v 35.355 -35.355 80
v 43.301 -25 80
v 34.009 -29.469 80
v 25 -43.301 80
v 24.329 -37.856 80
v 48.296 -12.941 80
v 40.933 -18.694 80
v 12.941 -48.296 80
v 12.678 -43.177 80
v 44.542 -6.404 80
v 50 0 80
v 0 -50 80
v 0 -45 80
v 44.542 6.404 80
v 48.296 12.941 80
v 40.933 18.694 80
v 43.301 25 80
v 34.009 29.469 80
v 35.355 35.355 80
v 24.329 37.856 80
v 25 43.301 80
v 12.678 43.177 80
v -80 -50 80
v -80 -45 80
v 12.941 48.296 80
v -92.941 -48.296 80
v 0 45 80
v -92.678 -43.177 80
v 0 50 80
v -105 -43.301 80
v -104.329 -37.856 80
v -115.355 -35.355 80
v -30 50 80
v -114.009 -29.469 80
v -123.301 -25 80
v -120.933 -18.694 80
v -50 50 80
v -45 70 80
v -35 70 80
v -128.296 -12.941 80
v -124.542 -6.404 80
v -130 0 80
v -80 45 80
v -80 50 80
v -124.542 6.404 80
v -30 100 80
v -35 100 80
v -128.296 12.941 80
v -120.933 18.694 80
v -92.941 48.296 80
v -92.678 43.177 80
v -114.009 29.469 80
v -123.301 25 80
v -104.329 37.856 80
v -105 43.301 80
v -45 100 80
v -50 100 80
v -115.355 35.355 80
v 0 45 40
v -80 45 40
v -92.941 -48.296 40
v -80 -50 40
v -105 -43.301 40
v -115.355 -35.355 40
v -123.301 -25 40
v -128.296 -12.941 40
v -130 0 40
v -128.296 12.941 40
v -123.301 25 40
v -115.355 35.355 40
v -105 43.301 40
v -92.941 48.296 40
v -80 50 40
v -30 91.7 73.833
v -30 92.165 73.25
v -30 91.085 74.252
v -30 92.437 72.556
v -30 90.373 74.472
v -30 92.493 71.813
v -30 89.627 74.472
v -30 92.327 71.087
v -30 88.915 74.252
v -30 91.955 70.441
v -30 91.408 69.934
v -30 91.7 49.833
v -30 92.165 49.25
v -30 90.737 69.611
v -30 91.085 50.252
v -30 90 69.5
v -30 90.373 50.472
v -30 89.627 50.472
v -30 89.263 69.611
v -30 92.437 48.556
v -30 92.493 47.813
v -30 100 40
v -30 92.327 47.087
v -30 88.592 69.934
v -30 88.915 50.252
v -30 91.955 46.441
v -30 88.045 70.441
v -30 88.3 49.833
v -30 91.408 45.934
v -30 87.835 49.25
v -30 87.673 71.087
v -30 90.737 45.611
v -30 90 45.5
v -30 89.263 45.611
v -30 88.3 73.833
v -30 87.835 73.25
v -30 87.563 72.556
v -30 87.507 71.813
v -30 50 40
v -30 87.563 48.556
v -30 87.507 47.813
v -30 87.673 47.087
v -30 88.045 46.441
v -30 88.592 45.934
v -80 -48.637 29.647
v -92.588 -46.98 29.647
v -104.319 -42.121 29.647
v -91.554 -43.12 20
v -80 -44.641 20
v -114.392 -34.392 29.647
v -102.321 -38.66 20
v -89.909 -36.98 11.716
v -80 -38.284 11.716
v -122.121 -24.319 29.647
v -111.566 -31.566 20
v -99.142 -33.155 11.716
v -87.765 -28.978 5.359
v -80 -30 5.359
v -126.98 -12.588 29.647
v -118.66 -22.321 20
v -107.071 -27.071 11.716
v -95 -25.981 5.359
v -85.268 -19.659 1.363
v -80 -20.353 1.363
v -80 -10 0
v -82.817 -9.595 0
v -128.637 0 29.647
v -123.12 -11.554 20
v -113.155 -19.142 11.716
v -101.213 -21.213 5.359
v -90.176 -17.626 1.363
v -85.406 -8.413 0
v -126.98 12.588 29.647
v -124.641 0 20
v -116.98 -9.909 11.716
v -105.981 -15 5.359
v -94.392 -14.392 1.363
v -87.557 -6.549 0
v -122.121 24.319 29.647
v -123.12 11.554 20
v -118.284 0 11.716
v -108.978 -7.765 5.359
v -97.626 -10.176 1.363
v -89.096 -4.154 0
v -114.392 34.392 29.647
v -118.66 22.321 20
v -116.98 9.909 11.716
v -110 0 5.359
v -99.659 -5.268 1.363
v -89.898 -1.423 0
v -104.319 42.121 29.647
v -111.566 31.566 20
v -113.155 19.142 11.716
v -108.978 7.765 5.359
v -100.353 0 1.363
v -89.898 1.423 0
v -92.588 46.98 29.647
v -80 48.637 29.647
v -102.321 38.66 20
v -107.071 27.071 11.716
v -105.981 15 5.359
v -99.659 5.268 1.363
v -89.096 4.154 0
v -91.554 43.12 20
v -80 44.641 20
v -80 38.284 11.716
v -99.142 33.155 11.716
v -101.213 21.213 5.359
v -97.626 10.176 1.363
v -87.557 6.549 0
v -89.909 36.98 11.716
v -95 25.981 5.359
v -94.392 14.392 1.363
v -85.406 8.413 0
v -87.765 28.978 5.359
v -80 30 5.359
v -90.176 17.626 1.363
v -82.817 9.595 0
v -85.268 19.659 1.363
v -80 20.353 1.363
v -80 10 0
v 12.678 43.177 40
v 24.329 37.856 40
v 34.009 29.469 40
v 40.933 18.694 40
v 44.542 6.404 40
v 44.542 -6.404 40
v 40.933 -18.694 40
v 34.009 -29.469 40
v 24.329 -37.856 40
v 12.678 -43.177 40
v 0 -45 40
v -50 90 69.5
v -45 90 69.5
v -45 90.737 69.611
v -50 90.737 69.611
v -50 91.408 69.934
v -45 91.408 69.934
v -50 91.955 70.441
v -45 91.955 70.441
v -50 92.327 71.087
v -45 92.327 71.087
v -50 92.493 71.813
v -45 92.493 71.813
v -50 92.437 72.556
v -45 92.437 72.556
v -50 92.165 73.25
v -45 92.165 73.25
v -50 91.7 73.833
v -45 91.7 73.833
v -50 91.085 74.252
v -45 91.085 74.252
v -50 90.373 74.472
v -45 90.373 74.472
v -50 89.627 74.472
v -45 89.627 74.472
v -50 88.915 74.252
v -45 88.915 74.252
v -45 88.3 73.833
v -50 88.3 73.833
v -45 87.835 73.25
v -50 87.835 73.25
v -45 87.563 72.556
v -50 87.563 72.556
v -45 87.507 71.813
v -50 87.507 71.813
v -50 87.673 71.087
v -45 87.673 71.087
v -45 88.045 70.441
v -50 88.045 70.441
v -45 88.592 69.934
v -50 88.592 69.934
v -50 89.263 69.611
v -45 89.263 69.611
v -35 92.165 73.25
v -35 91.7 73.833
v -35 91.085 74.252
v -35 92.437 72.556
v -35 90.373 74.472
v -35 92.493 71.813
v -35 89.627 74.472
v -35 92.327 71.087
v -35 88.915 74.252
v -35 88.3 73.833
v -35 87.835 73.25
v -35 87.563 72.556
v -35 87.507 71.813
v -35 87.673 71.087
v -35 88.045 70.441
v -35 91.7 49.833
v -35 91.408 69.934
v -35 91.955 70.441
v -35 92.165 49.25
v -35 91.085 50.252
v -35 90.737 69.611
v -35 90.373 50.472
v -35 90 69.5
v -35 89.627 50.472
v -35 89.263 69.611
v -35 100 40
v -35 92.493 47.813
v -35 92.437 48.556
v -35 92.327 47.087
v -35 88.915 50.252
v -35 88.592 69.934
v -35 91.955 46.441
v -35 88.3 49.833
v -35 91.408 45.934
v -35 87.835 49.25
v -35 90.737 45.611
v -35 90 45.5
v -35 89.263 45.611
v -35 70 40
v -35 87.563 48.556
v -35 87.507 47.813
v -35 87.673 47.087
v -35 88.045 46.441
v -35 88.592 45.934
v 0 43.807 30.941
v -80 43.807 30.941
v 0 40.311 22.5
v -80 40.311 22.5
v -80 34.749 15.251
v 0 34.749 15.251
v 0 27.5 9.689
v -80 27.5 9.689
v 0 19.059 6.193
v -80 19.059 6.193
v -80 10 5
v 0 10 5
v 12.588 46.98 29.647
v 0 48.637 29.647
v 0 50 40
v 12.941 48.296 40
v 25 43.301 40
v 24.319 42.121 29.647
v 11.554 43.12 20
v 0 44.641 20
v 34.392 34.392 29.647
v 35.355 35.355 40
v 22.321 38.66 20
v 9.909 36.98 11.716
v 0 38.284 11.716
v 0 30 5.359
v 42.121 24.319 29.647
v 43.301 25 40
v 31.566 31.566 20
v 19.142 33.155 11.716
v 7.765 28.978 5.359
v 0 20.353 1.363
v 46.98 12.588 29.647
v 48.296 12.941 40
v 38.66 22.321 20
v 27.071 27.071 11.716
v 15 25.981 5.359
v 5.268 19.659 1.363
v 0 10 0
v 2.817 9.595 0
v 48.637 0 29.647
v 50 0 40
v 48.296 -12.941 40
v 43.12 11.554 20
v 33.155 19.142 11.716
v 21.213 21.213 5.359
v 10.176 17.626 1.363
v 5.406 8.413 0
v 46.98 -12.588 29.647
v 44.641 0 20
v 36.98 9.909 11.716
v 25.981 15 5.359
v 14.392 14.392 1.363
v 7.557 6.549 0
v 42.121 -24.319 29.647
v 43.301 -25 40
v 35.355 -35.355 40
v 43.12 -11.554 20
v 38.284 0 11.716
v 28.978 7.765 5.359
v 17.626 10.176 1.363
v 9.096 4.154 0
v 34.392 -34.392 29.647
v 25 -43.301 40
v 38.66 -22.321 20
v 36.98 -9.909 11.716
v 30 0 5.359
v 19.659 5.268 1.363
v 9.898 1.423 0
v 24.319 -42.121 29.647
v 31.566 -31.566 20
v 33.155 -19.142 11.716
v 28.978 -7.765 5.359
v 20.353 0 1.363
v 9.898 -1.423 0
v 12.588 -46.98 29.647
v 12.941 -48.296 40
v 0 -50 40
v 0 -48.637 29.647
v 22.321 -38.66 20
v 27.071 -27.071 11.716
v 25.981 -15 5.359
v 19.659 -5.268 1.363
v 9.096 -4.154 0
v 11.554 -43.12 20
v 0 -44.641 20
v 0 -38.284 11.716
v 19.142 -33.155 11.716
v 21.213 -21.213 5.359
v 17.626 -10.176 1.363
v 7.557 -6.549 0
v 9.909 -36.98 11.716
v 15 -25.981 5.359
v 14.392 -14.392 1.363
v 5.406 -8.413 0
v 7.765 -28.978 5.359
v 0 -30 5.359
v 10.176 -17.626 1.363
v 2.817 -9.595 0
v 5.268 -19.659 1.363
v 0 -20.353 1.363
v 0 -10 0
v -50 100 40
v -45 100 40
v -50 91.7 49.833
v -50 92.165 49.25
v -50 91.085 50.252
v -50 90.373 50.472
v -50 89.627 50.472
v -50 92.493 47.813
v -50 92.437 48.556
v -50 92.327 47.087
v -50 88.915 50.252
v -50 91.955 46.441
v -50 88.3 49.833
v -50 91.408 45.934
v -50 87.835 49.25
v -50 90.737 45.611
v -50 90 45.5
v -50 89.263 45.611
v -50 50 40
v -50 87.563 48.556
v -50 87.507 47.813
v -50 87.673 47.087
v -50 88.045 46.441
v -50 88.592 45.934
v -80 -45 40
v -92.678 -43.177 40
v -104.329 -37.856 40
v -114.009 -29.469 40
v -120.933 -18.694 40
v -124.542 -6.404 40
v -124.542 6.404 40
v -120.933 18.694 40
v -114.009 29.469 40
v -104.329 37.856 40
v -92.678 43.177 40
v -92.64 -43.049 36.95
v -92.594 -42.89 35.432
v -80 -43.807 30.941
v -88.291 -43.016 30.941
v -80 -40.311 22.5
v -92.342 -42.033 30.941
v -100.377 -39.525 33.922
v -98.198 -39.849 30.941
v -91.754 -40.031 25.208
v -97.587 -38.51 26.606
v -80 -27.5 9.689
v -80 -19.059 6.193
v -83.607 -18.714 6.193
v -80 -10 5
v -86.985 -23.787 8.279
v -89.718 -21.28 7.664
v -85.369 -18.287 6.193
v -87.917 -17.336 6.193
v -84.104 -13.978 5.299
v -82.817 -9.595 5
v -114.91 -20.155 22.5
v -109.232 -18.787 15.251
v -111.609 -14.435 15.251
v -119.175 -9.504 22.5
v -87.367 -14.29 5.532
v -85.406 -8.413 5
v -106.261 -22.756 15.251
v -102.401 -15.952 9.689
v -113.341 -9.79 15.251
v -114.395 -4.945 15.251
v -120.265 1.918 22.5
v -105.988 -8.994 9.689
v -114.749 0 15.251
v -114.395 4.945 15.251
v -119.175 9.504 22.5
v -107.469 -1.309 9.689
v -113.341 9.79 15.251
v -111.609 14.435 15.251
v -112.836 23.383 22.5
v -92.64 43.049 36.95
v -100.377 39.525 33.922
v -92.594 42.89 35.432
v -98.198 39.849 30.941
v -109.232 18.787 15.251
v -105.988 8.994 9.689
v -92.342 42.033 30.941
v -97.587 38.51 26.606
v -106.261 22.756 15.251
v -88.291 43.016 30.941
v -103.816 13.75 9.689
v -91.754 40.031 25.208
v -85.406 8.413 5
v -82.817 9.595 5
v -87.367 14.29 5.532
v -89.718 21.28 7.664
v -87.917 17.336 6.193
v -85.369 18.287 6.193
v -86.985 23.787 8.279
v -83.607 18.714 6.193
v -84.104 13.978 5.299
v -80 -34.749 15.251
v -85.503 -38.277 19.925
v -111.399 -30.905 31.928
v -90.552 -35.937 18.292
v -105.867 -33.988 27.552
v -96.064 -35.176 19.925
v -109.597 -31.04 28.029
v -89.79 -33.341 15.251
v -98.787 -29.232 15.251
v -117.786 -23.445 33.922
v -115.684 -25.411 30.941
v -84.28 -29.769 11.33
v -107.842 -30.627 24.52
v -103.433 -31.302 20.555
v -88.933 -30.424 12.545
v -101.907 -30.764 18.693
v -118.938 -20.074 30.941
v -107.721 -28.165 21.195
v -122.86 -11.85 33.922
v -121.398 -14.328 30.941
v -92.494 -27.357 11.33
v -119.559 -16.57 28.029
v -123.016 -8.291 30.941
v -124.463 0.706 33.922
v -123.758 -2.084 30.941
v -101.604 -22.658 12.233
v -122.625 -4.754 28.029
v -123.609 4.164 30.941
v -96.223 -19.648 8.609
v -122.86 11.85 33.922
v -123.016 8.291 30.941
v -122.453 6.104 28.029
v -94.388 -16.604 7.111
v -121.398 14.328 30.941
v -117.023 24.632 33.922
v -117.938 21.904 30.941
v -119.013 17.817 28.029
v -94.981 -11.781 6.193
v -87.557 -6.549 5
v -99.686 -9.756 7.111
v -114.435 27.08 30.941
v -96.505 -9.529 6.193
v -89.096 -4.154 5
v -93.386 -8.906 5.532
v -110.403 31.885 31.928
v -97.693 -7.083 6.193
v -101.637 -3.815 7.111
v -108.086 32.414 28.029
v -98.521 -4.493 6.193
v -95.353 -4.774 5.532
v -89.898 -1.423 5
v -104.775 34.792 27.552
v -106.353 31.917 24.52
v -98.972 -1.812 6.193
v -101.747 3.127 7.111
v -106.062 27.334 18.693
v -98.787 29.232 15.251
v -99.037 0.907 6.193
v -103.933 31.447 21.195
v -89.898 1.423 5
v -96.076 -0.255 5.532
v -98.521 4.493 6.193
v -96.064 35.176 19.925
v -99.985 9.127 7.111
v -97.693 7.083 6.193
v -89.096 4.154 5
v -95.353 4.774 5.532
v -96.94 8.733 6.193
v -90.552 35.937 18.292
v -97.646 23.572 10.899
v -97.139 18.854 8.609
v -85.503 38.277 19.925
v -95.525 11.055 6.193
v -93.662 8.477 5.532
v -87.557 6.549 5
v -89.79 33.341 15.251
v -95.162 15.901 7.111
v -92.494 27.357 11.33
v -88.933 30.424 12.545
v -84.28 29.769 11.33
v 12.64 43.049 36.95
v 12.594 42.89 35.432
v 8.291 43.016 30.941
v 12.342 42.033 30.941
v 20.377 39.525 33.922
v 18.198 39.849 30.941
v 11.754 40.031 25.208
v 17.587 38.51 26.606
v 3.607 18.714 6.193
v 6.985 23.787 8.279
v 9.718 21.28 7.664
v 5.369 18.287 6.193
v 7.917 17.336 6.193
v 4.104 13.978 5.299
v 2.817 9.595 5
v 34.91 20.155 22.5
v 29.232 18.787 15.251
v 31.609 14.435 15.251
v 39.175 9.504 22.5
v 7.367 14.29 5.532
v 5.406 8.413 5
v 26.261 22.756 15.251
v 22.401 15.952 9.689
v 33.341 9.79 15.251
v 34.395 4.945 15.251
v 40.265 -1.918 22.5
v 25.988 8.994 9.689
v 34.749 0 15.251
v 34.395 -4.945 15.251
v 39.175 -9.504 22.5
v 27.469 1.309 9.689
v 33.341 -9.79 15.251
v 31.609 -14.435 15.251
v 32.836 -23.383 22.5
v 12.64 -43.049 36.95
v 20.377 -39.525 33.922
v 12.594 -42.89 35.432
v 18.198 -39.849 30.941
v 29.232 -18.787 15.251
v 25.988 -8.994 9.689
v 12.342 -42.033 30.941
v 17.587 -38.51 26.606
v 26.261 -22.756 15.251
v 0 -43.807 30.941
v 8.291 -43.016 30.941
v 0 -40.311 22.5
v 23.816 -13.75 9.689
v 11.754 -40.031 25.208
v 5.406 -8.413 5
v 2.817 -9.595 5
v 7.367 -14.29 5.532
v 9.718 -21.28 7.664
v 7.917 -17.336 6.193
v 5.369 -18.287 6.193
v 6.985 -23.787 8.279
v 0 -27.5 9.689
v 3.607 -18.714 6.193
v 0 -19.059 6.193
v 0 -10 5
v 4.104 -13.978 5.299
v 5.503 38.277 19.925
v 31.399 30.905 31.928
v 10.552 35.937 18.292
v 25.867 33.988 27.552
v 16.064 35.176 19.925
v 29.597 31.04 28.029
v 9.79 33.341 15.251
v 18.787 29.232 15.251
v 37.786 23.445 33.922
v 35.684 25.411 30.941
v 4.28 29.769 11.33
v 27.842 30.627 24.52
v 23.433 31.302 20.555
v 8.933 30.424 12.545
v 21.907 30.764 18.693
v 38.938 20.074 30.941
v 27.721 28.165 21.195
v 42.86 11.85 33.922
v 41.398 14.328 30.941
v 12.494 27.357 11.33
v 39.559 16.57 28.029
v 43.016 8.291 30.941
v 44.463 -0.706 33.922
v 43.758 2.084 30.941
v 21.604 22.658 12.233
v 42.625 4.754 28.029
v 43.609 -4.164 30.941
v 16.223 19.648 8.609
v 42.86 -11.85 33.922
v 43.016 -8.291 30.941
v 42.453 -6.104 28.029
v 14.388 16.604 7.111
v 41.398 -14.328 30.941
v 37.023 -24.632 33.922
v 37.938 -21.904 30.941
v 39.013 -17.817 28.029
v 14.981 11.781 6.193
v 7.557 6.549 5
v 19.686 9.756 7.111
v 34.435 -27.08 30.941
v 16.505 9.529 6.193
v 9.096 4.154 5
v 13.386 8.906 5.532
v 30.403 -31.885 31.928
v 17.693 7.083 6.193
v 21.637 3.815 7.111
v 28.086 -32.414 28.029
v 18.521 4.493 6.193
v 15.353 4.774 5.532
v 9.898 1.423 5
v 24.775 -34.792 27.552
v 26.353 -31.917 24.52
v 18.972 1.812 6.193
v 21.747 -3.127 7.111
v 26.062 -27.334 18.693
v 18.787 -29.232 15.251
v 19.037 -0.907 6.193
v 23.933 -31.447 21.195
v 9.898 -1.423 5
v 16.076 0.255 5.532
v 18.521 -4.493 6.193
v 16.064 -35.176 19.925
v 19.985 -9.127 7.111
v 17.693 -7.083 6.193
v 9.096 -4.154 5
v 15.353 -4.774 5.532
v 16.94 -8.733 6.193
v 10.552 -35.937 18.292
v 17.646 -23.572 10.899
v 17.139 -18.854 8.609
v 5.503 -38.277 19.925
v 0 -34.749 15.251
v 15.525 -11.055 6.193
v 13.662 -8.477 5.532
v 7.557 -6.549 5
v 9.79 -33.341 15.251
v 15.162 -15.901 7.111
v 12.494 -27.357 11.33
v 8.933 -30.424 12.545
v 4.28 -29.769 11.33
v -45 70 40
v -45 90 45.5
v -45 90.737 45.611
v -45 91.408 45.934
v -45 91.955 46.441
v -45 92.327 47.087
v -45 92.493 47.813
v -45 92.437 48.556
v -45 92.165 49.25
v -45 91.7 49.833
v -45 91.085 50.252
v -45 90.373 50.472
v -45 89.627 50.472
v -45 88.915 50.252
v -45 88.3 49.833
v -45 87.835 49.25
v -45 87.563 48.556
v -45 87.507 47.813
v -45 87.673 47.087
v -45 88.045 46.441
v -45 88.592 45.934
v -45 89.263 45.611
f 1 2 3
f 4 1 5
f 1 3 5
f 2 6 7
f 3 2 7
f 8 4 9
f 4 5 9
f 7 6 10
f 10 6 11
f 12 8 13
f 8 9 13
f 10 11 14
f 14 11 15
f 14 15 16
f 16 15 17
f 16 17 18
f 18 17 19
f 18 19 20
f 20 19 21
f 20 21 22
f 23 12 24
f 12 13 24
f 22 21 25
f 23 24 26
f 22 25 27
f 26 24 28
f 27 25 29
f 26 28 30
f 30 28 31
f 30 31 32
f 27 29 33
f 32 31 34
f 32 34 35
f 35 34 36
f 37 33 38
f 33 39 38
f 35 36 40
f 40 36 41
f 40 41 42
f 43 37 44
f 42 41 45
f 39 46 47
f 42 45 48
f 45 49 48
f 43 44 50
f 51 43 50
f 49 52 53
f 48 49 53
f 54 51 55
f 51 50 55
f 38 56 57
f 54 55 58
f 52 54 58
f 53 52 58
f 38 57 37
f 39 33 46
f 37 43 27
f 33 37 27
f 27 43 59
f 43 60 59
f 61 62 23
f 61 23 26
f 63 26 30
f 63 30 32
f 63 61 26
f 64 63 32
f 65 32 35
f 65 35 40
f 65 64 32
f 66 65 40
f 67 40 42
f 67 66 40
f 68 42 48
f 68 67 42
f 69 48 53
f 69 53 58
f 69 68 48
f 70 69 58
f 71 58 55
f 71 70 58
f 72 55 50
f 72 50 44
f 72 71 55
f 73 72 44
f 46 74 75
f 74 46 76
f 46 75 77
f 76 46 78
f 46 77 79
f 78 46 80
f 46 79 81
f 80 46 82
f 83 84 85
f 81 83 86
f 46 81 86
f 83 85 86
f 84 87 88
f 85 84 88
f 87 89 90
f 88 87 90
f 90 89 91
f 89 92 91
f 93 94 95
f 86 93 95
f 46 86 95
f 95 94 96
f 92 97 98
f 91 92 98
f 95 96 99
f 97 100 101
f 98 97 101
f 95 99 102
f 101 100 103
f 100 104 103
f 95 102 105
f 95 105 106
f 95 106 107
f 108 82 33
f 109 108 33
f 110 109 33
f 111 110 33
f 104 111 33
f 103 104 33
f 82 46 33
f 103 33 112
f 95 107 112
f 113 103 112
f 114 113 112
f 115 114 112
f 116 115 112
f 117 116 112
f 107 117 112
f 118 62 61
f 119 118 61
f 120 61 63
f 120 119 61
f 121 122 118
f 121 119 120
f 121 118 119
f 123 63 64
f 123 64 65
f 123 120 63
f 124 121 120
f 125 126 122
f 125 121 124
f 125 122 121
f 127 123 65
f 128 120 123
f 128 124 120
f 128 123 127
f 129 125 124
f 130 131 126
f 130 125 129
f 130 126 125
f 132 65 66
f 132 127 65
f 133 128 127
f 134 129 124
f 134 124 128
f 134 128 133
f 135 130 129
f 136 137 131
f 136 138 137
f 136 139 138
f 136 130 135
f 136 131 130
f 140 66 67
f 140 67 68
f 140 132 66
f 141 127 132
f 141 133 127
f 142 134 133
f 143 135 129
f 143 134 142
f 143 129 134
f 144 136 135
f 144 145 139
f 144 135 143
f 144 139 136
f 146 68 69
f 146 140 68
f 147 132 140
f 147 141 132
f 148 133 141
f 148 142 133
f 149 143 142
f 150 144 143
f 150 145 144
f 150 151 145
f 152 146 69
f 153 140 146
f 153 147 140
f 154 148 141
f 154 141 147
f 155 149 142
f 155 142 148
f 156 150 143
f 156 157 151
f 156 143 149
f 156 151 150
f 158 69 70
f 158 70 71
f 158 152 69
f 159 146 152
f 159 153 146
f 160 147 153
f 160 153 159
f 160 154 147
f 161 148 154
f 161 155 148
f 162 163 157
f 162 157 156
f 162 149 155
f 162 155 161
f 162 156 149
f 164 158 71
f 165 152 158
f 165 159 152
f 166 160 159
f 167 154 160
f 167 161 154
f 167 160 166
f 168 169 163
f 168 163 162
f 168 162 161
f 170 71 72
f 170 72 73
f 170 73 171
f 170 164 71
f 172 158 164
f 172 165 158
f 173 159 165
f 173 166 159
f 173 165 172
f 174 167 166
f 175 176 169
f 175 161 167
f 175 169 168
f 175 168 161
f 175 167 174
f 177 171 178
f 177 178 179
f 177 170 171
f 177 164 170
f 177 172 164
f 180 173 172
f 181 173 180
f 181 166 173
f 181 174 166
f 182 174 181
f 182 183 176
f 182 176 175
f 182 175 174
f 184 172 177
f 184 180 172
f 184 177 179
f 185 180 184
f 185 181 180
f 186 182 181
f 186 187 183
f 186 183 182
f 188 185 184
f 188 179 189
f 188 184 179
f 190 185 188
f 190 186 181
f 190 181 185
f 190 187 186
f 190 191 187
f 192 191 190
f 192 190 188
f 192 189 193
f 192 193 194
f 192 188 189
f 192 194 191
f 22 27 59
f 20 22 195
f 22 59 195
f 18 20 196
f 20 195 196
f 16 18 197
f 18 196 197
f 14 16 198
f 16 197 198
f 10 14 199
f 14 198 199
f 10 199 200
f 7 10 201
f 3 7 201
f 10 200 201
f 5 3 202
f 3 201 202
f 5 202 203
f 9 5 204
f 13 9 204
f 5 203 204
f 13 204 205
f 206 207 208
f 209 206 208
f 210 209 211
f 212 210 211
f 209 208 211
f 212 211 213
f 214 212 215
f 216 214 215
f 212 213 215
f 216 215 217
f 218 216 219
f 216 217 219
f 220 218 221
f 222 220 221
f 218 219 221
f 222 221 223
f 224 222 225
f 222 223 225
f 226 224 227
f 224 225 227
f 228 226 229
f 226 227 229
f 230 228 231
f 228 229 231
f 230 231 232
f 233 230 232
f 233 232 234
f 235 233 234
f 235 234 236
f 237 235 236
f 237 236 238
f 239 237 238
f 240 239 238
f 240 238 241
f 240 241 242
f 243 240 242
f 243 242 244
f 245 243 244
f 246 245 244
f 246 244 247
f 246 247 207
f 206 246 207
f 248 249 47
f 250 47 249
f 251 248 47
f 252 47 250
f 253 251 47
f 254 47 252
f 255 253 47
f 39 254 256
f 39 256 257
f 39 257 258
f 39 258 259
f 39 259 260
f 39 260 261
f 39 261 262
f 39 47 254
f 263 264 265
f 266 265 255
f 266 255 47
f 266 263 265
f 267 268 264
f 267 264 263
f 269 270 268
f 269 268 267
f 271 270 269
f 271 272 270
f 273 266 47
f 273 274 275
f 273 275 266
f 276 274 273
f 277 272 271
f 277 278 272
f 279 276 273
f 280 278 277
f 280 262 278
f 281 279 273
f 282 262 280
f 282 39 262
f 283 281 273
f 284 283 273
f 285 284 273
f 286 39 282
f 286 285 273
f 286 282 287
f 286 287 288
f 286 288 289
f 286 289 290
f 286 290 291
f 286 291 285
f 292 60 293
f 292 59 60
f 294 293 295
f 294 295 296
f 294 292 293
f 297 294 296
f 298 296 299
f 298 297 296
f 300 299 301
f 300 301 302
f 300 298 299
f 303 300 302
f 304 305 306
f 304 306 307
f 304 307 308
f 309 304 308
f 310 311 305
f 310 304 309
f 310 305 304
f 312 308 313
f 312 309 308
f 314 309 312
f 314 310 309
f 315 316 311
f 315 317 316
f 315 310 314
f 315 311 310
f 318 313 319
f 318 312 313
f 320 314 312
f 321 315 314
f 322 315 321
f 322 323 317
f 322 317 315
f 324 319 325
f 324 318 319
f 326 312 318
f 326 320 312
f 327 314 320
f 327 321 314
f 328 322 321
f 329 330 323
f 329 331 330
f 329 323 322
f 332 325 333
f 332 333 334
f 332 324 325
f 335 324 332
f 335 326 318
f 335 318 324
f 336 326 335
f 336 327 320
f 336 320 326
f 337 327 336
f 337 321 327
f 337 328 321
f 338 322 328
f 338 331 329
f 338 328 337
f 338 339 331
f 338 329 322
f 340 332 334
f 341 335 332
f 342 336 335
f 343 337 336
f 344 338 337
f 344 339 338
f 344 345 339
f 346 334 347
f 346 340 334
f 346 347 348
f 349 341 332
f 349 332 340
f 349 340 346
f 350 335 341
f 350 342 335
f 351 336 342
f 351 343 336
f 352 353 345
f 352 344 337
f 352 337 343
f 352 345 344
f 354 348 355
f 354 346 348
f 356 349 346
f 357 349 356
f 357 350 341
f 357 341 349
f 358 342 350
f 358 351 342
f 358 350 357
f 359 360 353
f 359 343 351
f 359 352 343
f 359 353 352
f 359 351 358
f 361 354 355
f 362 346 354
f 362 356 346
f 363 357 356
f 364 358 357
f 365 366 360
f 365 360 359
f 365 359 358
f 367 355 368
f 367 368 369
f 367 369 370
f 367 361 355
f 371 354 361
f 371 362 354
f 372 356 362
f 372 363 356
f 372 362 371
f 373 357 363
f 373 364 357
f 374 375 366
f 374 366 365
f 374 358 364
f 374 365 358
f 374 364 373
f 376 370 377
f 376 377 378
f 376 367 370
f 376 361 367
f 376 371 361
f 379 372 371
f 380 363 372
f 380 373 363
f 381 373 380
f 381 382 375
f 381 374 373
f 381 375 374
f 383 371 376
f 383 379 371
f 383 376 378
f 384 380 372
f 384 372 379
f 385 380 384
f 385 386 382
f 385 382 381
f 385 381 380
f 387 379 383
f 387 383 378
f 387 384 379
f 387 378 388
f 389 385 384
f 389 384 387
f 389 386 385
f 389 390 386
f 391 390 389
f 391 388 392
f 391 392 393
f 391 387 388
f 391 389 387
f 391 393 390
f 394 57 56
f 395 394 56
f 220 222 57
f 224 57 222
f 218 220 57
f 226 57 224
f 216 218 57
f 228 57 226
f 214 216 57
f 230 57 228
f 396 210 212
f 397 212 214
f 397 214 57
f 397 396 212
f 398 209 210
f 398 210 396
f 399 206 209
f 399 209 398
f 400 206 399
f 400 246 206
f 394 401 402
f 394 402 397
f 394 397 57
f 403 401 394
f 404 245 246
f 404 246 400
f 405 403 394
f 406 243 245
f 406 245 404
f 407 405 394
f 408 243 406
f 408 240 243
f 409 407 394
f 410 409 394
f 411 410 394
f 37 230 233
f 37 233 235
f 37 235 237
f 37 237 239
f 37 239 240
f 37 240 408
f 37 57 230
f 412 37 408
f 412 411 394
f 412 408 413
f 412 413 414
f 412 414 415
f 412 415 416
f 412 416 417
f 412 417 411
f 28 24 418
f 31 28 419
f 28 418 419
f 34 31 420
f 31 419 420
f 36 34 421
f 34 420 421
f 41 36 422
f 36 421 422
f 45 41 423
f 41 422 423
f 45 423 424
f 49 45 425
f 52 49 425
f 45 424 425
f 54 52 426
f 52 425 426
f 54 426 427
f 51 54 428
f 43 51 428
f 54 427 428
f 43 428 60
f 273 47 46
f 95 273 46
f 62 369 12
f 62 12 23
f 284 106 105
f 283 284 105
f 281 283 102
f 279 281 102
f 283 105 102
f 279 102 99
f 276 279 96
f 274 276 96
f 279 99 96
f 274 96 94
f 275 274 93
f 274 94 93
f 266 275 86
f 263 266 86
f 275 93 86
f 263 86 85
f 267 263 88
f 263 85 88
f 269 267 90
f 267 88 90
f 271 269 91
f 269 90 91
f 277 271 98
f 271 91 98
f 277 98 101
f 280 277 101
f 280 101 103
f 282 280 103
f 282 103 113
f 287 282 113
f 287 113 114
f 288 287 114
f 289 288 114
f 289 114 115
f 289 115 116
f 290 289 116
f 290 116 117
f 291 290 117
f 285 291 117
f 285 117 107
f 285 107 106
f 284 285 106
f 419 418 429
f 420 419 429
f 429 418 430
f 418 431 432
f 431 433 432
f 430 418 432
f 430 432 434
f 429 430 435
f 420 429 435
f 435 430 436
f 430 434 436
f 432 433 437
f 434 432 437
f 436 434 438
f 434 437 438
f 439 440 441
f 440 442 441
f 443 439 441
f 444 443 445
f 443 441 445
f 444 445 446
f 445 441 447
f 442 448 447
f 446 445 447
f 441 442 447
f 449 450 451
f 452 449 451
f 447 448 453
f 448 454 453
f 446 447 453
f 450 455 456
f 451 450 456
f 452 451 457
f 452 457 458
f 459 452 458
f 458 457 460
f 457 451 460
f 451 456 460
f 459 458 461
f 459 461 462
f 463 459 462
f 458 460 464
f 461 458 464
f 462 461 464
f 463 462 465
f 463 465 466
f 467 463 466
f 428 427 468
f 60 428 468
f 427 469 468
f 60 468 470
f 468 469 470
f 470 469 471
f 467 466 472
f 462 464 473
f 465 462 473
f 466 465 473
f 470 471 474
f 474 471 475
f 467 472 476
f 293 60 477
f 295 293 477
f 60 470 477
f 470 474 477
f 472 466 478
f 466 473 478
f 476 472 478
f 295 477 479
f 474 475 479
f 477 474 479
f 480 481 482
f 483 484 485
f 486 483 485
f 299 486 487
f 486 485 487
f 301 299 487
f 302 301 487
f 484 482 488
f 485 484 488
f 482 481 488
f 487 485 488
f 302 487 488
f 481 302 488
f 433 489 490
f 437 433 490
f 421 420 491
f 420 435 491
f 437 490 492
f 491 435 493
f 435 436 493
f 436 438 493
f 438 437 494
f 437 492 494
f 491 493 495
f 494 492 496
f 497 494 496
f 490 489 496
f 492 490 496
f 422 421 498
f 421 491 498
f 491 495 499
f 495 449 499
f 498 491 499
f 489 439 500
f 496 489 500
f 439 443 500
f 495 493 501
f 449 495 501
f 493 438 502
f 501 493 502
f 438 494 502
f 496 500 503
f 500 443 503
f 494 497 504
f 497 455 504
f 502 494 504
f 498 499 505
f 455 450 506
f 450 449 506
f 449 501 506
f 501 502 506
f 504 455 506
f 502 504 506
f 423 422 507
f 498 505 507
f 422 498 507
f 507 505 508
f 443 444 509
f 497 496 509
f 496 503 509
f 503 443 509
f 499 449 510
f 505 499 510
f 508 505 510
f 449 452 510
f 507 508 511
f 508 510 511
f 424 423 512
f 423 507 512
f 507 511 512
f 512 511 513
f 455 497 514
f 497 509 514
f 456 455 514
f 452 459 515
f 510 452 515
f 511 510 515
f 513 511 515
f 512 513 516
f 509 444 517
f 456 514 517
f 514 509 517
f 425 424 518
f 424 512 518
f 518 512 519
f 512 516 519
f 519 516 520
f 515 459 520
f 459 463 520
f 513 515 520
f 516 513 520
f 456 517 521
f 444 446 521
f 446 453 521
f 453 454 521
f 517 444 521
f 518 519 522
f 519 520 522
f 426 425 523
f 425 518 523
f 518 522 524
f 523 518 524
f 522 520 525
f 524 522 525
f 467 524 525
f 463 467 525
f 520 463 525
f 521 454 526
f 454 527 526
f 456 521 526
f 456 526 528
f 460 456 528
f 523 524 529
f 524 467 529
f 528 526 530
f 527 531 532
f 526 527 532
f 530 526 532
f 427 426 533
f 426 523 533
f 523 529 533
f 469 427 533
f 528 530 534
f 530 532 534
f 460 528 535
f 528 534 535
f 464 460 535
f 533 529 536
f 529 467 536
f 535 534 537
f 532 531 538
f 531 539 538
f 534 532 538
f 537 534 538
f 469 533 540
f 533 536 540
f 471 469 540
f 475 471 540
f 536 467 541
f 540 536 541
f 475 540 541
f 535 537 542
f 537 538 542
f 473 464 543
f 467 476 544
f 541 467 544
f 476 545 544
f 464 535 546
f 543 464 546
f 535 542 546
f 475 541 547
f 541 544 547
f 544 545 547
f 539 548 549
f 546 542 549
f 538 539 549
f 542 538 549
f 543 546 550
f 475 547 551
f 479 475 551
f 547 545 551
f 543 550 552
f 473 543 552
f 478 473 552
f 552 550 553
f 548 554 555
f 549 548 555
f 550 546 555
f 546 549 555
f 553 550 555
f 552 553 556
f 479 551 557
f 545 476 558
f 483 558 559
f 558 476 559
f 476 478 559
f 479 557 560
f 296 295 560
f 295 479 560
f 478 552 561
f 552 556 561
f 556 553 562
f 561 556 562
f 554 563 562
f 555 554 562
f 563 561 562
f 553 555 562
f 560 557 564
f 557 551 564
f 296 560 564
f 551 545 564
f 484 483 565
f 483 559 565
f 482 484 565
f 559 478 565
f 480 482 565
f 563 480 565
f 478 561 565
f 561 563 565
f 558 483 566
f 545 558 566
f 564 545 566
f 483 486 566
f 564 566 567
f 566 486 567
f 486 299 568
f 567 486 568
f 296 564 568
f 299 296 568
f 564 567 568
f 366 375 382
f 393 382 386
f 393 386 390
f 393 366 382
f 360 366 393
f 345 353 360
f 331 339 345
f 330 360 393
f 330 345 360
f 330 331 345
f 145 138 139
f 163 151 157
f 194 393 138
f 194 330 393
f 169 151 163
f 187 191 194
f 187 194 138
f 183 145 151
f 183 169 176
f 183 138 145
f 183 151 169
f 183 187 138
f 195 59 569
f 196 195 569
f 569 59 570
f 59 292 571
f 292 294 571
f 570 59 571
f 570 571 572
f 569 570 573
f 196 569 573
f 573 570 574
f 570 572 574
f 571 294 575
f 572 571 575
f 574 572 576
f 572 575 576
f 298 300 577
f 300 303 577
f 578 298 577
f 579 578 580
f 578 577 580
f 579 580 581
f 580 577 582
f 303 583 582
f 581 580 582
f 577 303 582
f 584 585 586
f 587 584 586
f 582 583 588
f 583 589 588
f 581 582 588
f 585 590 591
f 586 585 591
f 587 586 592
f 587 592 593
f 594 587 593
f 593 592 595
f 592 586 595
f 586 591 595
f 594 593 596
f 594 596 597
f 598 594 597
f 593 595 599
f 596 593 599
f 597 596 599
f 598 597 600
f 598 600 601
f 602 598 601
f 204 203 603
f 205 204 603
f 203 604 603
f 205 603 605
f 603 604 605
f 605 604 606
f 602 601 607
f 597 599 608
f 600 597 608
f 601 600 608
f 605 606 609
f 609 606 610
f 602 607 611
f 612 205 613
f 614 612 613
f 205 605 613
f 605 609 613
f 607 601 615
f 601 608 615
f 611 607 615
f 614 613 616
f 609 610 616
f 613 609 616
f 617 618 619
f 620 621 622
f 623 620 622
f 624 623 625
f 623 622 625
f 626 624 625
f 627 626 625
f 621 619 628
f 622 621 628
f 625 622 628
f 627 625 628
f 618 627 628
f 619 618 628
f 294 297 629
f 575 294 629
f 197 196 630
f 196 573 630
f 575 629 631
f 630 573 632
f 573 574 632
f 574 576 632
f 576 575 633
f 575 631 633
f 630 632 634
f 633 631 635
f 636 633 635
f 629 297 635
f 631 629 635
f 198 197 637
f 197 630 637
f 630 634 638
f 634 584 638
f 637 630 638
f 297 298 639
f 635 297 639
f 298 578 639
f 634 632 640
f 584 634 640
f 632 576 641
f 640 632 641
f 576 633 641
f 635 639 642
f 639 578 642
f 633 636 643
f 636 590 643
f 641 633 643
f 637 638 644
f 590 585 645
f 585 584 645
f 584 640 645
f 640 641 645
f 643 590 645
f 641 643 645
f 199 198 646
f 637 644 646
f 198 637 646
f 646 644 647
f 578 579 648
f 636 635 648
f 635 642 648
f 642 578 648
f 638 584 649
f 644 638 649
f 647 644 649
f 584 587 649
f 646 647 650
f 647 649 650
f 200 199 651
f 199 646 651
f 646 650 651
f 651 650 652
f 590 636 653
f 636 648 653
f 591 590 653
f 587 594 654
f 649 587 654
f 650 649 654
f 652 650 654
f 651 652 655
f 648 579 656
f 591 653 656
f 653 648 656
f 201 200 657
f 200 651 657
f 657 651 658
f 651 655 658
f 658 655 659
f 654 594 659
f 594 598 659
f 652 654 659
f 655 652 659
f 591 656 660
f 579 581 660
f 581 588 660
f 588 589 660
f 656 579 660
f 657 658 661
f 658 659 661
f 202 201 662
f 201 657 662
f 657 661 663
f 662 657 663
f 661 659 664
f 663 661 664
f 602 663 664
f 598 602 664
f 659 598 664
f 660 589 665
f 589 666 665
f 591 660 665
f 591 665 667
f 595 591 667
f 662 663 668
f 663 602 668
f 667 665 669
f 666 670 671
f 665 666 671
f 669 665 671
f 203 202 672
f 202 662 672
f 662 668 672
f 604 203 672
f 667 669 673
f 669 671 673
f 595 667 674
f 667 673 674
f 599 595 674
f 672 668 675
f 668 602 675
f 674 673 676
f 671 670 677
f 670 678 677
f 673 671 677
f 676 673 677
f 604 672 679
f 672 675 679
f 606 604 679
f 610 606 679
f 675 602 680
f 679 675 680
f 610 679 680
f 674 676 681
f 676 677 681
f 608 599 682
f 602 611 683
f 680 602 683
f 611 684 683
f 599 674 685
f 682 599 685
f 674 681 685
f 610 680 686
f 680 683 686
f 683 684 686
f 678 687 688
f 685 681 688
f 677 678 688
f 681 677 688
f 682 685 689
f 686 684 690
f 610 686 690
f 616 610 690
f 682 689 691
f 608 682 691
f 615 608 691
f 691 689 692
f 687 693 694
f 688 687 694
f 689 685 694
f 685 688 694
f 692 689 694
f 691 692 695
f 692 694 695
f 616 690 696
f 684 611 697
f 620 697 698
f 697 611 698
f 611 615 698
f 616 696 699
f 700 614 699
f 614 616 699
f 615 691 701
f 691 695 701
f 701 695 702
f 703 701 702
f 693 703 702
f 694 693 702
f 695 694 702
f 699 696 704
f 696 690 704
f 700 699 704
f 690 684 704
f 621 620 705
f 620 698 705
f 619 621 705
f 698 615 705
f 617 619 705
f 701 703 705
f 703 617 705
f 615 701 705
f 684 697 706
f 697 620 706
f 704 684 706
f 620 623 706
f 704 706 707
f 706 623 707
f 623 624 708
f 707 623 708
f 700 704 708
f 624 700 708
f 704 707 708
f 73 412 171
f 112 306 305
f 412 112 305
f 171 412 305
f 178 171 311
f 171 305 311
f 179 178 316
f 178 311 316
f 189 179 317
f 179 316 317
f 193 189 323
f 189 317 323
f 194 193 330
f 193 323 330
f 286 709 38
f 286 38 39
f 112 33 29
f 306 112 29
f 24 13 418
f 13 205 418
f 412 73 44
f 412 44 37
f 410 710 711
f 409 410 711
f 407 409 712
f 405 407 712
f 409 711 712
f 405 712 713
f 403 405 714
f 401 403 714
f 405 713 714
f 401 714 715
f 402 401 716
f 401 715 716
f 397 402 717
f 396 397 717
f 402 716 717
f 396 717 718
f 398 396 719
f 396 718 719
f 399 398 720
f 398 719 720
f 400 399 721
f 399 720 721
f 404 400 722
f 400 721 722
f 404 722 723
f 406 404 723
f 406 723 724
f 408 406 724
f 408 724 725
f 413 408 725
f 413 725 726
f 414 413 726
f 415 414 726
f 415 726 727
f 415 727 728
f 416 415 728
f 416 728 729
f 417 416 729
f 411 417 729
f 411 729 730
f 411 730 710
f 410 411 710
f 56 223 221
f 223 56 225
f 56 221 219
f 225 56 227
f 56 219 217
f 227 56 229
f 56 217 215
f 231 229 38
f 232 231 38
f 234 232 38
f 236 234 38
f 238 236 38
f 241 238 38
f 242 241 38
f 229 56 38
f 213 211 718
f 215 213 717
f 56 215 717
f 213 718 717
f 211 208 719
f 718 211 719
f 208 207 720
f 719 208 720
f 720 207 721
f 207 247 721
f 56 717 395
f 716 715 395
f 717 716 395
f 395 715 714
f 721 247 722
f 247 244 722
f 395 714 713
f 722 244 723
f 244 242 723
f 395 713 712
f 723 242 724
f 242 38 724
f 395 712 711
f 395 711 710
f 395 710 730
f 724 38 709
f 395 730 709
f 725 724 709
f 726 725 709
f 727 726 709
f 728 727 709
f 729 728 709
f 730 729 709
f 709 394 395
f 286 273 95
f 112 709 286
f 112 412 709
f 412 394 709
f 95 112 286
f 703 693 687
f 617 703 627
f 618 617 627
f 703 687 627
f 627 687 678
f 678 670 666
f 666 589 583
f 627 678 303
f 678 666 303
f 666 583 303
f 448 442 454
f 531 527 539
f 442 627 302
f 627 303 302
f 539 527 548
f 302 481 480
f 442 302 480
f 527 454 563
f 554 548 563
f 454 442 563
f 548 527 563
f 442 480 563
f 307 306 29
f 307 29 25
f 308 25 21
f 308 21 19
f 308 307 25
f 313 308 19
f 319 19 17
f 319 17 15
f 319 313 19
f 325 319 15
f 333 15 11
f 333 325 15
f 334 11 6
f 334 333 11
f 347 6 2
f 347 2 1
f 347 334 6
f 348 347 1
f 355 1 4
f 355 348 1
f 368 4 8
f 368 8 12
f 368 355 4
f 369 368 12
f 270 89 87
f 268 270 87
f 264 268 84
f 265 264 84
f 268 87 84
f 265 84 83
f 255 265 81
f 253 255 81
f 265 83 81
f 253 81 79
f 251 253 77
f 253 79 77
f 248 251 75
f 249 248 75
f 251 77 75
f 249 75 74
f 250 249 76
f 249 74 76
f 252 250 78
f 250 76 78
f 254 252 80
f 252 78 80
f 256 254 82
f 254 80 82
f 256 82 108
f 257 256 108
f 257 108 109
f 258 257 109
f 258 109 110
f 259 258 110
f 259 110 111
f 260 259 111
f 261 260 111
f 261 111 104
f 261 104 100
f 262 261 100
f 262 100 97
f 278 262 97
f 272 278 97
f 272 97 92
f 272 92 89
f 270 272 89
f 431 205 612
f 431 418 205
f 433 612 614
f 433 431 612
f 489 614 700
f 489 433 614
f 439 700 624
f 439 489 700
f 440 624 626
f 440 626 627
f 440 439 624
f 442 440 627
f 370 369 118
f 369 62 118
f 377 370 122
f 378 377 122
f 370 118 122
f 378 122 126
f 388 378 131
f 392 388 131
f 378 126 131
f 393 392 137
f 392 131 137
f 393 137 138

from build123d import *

# Parameters (mm, degrees)
BOSS_EXTRUDE1_DEPTH          = 80
FILLET1_R                    = 40
SHELL1_T                     = -5
SKETCH3_W                    = 20
SKETCH3_H                    = 40
BOSS_EXTRUDE2_DEPTH          = 50
CUT_EXTRUDE_THIN1_DEPTH      = 215.00934559
CUT_EXTRUDE_THIN1_DEPTH_BACK = 30
SKETCH4_W                    = 10
SKETCH4_H                    = 40
SKETCH5_R                    = 2.5
CUT_EXTRUDE1_DEPTH           = 92


with BuildPart() as part:
    # Sketch2 → Boss-Extrude1 (new body)
    with BuildSketch(Plane.XY):
        with BuildLine():
            Line((0, -50), (-80, -50))
            ThreePointArc((-80, -50), (-130, 0), (-80, 50))
            Line((-80, 50), (0, 50))
            ThreePointArc((0, 50), (50, 0), (0, -50))
        make_face()
    extrude(amount=BOSS_EXTRUDE1_DEPTH)

    # Fillet1
    fillet1_edges = [part.edges().sort_by_distance(p)[0] for p in [
        (-40, -50, 0),
        (-130, 0, 0),
        (-40, 50, 0),
        (50, 0, 0),
    ]]
    fillet(fillet1_edges, radius=FILLET1_R)

    # Shell1
    shell1_openings = [part.faces().sort_by_distance(p)[0] for p in [
        (-40, 0, 80),
    ]]
    offset(amount=SHELL1_T, openings=shell1_openings, kind=Kind.INTERSECTION)

    # Sketch3 → Boss-Extrude2 (add)
    with BuildSketch(Plane(origin=(0, 50, 0), x_dir=(1, 0, 0), z_dir=(0, 1, 0))):
        with Locations((-40, -60)):
            Rectangle(SKETCH3_W, SKETCH3_H)
    extrude(amount=BOSS_EXTRUDE2_DEPTH)

    # Sketch4 → Cut-Extrude-Thin1 (cut, two sides: drawn at the far end of the back side and taken through both)
    with BuildSketch(Plane(origin=(0, 100, 0), x_dir=(1, 0, 0), z_dir=(0, 1, 0)).offset(-CUT_EXTRUDE_THIN1_DEPTH_BACK)):
        with Locations((-40, -60)):
            Rectangle(SKETCH4_W, SKETCH4_H)
    extrude(amount=CUT_EXTRUDE_THIN1_DEPTH + CUT_EXTRUDE_THIN1_DEPTH_BACK, mode=Mode.SUBTRACT)

    # Sketch5 → Cut-Extrude1 (cut)
    with BuildSketch(Plane(origin=(-30, 0, 0), x_dir=(0, 0, -1), z_dir=(1, 0, 0))):
        with Locations((-72, 90)):
            Circle(SKETCH5_R)
        with Locations((-48, 90)):
            Circle(SKETCH5_R)
    extrude(amount=-CUT_EXTRUDE1_DEPTH, mode=Mode.SUBTRACT)


solid = part.part
